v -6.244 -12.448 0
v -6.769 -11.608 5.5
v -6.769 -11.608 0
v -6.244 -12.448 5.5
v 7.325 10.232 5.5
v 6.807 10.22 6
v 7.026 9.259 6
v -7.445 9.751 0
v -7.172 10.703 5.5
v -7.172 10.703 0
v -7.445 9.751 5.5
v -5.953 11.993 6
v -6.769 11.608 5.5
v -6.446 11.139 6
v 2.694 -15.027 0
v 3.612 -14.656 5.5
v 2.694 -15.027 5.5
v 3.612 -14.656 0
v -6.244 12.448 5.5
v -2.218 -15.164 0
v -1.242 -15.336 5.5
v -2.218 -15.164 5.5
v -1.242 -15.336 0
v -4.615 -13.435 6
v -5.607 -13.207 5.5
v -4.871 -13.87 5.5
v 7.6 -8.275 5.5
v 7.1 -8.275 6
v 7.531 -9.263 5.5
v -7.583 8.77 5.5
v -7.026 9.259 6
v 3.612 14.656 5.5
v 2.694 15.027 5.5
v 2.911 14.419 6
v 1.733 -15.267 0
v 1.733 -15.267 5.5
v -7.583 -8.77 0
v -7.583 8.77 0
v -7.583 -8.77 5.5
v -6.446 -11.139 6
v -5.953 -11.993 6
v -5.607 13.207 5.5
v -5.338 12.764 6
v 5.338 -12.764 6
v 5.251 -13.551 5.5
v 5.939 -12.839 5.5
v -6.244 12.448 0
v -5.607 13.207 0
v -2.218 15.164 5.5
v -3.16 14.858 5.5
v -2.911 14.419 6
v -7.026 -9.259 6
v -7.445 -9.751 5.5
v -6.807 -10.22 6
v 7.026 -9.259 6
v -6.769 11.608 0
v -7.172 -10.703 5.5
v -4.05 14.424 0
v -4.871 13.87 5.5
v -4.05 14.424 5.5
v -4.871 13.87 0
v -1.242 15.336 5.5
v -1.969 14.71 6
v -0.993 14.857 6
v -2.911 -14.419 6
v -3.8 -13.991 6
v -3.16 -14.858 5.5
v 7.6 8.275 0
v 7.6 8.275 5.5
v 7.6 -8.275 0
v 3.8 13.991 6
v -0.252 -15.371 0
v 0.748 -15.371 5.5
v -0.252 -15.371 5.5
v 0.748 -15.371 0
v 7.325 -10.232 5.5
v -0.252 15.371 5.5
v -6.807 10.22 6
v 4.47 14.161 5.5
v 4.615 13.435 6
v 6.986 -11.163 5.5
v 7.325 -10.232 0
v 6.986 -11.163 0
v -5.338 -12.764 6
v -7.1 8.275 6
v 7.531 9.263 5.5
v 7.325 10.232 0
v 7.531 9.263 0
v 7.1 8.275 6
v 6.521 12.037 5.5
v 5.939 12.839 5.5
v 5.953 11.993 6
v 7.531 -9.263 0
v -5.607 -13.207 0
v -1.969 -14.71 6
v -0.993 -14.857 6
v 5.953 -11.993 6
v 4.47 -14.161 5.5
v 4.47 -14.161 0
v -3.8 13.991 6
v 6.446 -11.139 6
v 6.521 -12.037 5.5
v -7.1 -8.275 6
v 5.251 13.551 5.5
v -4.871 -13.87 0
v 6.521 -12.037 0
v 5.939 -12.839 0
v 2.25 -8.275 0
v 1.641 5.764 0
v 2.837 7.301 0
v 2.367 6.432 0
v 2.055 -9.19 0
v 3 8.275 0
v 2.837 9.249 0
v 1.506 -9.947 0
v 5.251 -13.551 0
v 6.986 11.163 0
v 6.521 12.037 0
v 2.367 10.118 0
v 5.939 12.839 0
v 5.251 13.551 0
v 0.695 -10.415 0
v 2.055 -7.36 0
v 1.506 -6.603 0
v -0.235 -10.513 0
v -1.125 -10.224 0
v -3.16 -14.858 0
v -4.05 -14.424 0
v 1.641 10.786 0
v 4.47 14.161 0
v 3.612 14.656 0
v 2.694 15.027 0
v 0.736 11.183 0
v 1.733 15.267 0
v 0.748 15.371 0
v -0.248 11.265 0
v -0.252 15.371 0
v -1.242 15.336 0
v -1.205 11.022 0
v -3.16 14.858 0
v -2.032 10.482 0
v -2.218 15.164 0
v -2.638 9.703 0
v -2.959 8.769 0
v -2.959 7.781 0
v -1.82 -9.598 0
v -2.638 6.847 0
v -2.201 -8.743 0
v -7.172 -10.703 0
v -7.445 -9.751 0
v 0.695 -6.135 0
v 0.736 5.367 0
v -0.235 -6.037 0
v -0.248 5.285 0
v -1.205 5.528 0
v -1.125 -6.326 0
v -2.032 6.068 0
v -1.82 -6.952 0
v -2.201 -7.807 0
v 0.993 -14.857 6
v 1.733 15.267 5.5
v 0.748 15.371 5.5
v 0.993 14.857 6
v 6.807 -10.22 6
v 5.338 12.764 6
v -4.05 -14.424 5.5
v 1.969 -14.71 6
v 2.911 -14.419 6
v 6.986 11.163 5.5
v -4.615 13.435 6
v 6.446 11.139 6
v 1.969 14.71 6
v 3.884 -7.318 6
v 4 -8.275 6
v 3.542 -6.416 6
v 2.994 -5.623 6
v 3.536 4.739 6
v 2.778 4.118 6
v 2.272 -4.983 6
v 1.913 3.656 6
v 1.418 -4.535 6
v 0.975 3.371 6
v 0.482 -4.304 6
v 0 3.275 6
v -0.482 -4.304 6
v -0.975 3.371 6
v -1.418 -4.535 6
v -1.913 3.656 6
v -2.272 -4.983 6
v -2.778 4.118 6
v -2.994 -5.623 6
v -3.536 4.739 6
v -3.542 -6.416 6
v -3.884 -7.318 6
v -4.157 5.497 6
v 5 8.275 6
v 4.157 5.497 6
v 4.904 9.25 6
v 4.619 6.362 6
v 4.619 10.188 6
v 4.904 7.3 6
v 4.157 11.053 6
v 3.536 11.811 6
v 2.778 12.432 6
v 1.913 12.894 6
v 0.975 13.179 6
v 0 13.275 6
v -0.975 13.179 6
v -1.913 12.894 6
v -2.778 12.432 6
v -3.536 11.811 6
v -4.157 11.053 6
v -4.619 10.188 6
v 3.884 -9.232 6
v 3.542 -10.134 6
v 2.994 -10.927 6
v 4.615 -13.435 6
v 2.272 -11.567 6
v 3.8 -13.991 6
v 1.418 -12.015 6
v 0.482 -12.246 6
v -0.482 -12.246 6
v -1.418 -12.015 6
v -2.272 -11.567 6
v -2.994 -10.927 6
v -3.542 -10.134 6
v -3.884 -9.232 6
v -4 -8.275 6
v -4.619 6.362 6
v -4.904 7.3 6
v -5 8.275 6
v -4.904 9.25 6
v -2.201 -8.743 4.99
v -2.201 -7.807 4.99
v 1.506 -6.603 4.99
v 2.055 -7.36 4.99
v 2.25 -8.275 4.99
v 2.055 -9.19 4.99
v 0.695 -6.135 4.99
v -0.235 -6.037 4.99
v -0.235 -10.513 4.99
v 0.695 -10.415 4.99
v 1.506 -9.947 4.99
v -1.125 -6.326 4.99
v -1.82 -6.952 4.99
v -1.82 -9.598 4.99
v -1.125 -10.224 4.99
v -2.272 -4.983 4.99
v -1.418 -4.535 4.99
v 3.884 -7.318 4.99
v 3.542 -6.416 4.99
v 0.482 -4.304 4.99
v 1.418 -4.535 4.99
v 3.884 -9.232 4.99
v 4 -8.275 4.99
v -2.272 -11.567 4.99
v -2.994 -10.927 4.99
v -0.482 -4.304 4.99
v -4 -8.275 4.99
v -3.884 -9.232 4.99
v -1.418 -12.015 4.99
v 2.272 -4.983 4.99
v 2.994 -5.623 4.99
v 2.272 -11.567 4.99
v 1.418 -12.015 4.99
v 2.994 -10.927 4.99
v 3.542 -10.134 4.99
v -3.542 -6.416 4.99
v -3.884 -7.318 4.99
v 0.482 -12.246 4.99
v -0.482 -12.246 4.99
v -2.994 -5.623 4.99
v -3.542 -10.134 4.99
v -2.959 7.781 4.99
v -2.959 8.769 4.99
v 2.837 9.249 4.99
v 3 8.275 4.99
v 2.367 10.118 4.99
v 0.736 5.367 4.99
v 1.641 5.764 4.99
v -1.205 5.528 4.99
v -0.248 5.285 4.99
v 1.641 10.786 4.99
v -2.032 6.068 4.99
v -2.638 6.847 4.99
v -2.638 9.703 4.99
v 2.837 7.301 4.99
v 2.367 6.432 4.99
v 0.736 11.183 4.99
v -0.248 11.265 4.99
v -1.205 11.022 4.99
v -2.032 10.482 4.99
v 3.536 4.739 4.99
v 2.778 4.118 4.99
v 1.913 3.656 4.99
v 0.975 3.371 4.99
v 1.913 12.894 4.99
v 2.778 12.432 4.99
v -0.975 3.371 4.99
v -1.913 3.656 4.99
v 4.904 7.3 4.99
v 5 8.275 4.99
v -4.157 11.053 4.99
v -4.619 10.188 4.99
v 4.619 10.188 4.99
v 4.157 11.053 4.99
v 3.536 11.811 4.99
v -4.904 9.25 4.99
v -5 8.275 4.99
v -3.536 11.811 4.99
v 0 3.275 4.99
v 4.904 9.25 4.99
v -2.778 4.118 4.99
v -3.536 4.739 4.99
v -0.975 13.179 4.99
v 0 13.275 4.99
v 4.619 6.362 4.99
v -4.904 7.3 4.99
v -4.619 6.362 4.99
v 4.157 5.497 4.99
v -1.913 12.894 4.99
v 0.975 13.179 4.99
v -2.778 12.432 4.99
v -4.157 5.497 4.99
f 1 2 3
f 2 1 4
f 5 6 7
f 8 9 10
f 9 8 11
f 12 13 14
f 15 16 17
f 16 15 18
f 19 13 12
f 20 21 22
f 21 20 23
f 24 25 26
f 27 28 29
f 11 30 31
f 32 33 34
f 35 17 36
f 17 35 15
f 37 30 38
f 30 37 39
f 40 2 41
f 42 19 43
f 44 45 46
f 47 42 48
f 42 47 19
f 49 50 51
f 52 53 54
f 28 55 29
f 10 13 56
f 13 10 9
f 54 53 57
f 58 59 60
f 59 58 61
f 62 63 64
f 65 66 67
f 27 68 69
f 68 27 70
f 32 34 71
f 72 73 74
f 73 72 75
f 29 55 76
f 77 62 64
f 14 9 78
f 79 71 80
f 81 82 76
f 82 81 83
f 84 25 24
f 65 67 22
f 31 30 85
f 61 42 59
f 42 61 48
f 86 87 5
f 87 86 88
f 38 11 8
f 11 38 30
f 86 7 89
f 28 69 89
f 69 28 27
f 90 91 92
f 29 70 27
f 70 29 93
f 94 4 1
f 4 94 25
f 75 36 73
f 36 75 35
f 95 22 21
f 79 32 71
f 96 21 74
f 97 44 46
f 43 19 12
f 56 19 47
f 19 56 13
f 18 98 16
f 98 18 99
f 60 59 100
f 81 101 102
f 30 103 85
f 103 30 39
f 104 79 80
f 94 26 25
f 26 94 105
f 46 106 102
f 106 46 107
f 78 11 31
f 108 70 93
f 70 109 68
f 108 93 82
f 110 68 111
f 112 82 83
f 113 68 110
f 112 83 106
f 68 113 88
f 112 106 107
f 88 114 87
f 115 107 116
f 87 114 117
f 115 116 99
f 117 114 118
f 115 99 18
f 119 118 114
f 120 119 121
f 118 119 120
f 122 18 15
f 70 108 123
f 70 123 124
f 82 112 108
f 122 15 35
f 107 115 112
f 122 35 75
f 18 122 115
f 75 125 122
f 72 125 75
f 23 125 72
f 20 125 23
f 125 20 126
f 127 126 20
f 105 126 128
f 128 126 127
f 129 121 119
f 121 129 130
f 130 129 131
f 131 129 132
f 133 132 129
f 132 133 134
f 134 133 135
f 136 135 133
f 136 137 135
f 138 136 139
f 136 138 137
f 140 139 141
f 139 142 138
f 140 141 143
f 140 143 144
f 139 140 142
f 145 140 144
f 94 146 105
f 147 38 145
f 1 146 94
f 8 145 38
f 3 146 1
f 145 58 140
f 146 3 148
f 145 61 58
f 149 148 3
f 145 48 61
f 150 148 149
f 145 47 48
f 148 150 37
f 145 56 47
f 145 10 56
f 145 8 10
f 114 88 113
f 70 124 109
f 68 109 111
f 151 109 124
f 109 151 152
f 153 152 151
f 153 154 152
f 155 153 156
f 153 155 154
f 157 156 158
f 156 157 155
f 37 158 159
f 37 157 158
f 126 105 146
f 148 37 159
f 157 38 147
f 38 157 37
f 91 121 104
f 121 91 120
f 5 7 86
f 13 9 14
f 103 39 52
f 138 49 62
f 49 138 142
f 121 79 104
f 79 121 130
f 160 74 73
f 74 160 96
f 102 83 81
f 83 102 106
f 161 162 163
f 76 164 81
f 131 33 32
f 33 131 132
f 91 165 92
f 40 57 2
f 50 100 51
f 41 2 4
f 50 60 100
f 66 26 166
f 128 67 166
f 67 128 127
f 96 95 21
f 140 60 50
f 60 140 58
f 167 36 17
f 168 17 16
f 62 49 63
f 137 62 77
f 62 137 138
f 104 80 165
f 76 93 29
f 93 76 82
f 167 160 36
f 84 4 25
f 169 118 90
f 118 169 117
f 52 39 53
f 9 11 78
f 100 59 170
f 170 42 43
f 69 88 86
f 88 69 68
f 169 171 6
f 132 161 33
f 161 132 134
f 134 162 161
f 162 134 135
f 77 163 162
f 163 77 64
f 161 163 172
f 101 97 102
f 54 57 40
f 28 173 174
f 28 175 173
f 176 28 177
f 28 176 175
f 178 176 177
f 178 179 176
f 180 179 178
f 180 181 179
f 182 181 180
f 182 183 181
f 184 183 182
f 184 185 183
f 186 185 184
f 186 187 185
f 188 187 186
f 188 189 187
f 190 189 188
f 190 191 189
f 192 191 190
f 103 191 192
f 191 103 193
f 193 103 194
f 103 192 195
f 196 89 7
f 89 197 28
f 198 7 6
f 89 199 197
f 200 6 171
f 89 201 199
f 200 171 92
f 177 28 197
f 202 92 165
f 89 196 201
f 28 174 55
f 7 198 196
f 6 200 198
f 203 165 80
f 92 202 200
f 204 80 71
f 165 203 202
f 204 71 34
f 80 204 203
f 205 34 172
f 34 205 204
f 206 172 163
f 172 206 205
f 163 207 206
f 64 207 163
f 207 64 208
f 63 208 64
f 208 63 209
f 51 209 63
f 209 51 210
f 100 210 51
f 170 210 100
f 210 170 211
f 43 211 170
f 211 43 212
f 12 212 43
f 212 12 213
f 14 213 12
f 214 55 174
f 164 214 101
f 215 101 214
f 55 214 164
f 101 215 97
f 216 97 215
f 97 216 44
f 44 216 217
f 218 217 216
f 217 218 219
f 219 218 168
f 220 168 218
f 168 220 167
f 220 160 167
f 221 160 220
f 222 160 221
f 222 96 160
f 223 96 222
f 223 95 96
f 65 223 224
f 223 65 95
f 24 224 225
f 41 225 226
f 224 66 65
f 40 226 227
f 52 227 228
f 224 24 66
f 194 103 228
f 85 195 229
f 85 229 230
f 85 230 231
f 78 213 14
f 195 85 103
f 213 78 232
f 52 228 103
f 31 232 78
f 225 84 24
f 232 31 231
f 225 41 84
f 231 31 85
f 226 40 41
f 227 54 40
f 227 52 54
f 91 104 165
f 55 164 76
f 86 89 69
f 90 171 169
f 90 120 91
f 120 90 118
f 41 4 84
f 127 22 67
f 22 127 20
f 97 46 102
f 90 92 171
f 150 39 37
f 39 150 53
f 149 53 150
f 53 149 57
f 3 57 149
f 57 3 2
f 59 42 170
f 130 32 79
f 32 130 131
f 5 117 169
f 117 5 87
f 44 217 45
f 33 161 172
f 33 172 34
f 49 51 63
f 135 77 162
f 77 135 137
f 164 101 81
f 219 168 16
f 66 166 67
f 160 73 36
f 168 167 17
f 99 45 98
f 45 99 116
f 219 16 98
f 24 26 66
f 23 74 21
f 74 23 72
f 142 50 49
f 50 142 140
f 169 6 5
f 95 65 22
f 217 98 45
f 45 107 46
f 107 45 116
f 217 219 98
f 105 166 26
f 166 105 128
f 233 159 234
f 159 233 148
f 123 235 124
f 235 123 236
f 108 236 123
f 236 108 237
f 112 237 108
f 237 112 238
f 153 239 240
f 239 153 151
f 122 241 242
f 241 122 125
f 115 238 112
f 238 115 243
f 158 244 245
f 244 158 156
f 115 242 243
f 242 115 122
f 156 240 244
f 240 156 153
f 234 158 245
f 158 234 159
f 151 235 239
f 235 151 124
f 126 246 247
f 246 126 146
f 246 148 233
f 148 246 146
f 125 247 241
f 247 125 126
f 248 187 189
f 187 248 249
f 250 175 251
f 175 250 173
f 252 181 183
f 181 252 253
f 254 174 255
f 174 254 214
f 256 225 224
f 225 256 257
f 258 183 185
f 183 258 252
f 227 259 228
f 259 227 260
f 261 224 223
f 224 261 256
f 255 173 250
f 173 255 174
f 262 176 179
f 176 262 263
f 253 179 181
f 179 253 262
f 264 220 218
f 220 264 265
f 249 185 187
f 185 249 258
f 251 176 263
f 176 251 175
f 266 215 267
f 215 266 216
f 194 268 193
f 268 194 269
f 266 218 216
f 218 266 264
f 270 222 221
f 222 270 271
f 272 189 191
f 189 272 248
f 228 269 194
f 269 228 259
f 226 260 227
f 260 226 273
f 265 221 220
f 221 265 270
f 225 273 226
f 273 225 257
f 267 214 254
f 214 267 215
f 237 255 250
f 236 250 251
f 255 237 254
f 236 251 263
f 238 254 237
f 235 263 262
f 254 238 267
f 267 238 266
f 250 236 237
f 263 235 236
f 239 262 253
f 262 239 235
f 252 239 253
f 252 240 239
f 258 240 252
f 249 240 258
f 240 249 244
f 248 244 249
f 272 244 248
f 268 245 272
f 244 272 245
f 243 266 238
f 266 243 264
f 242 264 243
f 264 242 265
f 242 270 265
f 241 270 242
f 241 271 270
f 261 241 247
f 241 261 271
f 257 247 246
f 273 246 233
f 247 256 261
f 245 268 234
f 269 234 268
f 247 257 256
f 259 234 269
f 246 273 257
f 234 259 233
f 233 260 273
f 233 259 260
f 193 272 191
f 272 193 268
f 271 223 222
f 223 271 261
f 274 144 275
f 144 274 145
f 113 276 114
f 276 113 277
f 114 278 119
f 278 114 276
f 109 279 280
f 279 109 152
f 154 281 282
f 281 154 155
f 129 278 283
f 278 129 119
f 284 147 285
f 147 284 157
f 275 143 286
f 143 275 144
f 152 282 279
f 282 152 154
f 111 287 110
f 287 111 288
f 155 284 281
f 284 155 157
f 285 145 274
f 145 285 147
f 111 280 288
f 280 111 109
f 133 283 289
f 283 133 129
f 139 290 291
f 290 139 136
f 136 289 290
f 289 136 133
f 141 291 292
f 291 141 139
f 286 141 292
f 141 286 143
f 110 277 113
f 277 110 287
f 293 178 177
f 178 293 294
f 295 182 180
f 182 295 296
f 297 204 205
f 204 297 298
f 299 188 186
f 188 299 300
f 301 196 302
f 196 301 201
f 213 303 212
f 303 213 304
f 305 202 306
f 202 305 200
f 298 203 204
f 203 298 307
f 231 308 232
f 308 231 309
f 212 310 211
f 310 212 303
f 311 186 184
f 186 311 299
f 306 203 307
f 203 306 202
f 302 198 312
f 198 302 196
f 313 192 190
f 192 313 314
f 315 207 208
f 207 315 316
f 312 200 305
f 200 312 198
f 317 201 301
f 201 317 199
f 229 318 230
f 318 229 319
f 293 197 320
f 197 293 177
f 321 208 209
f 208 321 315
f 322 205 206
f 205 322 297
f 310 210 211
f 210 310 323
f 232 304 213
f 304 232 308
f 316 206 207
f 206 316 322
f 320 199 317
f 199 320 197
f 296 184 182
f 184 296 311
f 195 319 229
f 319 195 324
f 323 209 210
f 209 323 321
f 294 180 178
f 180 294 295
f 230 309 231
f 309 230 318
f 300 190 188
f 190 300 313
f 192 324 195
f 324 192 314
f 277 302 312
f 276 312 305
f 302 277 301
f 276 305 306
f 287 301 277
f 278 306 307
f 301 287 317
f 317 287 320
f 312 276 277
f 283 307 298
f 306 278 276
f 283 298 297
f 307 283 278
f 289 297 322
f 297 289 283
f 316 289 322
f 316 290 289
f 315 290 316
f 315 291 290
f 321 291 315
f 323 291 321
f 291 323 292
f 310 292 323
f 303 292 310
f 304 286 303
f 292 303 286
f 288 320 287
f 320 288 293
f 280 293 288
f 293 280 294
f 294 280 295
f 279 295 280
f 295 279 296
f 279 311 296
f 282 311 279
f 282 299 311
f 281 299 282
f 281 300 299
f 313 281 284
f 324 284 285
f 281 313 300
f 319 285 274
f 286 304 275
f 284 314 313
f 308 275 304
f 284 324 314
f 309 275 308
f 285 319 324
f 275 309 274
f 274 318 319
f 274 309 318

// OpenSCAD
// file: base_config.scad
atx_height=86.6;
atx_width=150;
atx_depth=140;
vertical_buffer=5.2; //2.6 above and below atx box

atx_upper_screw_spacing=138;

atx_upper_screw_height=80;

grid_wall_thick=10;

wall_screw_vert=10;
wall_screw_horz=12;

atx_screw_depth=12.7-5.8;

atx_screw_slot=3.9;
atx_screw_head=7.5;

atx_screw_head_t=2.4;

m4_head = 8;
m4_nut_r=8.1/2;
m3_head_r=6.1/2;
m3_head_t=2.5;
m4_slot=4.5;

dual_overlap=(6.6/2+3.2);
// file: config.scad
//triangular vertex peices
$fa=1;
$fs=1;
ep=0.01;
//parametrics
//cutout for the AL extrusions, with 2 opposite tracks having an inset
//tweaked from ideal to satisfy printing limits
side=20;    //size of a side of the extrusion
slot=6-.4;     //width of the slots, on the face
central=8+1;  //how wide the central pillar is; the slot depth is then (side-central)/2
//corner radius
vertex_rad=40;
//distance from edge to vertical 2020 shaft
vert_inset=6;
//thickness of the wall on the inside of the triangle
inside_wall_thick=6;
//belt channel width
channel_width=26;
//lenght of plastic alongside in-plane extrusion
wing_length=70;
//height of the frame piece
piece_h=50;
//mounting hardware
m5_slot=6;
m5_head=10; //diameter of M5 head
m5_wall=5; //thickness of plastic between M5 and extrusion
//m3 sizing
m3_slot=3.5;
m3nut_r=6.6/2;
m3nut_t=3;
module 2020_cutout_two()
{
    ss=side+.8; //printer tolerance
    difference()
    {
        //main body
        square([ss,ss],center=true);
        //track slots
        translate([ss/2+central/2,0])square([ss,slot],center=true);
        translate([-(ss/2+central/2),0])square([ss,slot],center=true);
        translate([0,(ss/2+central/2)])square([slot,ss],center=true);
    }
}
module nut_fill()
{
    nut_w=10.5+1;
    nut_w_b=6.5+1.5;
    nut_depth=(side-central)/2;
    //spaces for inserting the t slot nuts
    //translate([0,0,-nut_depth/2])
    hull()
    {
        cube([nut_w+3,nut_w*2,ep],center=true);
        translate([0,0,-nut_depth])cube([nut_w_b,nut_w*2,ep],center=true);
    }
    //cube([nut_w,nut_w*2,nut_depth],center=true);
}
module base_shape()
{
    difference()
    {
        union()
        {
            //rounded vertex
            circle(r=vertex_rad,center=true);
            //'wings' along in plane extrusion lengths
            rotate([0,0,60])translate([-side+vertex_rad-inside_wall_thick*2,wing_length/2])square([inside_wall_thick*4,wing_length],center=true); 
            rotate([0,0,-60])translate([-side+vertex_rad-inside_wall_thick*2,-wing_length/2])square([inside_wall_thick*4,wing_length],center=true); 
        }
        //in plane extrusions
        rotate([0,0,60])translate([-side/2+vertex_rad,vertex_rad/2])square([side,vertex_rad],center=true);
        rotate([0,0,-60])translate([-side/2+vertex_rad,-vertex_rad/2])square([side,vertex_rad],center=true);
        //vertical extrusion
        translate([(-side/2)+vertex_rad-vert_inset,0,0])rotate([0,0,90])2020_cutout_two();
        //opening for belts or motor
        motor_gap();
        //any remaining portion of hte circle we want removed
        open_inside();
    }
}
module motor_gap()
{
    //create rough triangle of unneeded area
    round=2;
    xx=-side-inside_wall_thick-round;
    qq=-(channel_width)/2+vertex_rad-vert_inset-side-inside_wall_thick;
    //make round
    minkowski()
    {
        intersection()
        {
            rotate([0,0,60])translate([xx,0])square([vertex_rad*2,vertex_rad*4],center=true);
            rotate([0,0,-60])translate([xx,0])square([vertex_rad*2,vertex_rad*4],center=true);
            translate([qq,0])square([channel_width-round*2,vertex_rad*2],center=true);
        }
        circle(r=round+0.01,$fn=40);
    }
}
module open_inside()
{
    //rest of interior
    //create rough triangle of unneeded area
    round=2;
    xx=-side-inside_wall_thick-round;
    qq=-side-inside_wall_thick-vert_inset-channel_width-inside_wall_thick;
    //make round
    minkowski()
    {
        intersection()
        {
            rotate([0,0,60])translate([xx,wing_length])square([vertex_rad*2,vertex_rad*4+wing_length],center=true);
            rotate([0,0,-60])translate([xx,-wing_length])square([vertex_rad*2,vertex_rad*4+wing_length],center=true);
            translate([qq,0])square([vertex_rad*2-round*2,vertex_rad*2+wing_length],center=true);
        }
        circle(r=round+0.01,$fn=40);
    }
}
// main file
include <config.scad>;
include <base_config.scad>;

base_ext_l=331;

fit_tolerance=.5; //added gap between elements

bracket_wall=3.2;

truss_wall=2.39;

bevel=.5;

//edge to (upper) hole
euh=(base_ext_l-atx_upper_screw_spacing)/2;
//additional added to left side edge, to cover area around mount
mount_overlap=5;
//center of hole to edge of screw recess, and edge total overlap
eto=atx_screw_head/2+mount_overlap;
plate_round=2;
//plate height
ph=vertical_buffer+atx_height-fit_tolerance*2; //tolerance gap top and bottom

//ATX box needs a little bit of recess
atx_recess=grid_wall_thick-(atx_screw_depth+atx_screw_head_t);

//right();
//left();
base_tie();

module left()
{
    translate([.5*(eto+euh-fit_tolerance)+fit_tolerance-base_ext_l/2,0,0])
    {
        difference()
        {
            union()
            {
                rough_shape();
                slope();
            }
            atx_cutout();
            truss_grid(truss_wall);
            mirror([0,1,0])truss_grid(truss_wall);
            m3_holes();
            atx_holes_left();
            m4_hole();
        }
        
        difference()
        {
            m4_mount();
            m4_hole();
        }
    }
}

module right()
{
    mirror([1,0,0])translate([.5*(eto+euh-fit_tolerance)+fit_tolerance-base_ext_l/2,0,0])
    {
        difference()
        {
            union()
            {
                rough_shape();
                rough_shape_right();
                slope();
            }
            atx_cutout_right();
            truss_grid(truss_wall);
            mirror([0,1,0])truss_grid(truss_wall);
            m3_holes();
            atx_holes_right();
            m4_hole();
        }
        
        difference()
        {
            m4_mount();
            m4_hole();
        }
    }
}

//connector from m4 to M5 on extrusion
module base_tie()
{
    spacing=(m4_nut_r+2.0)+side/2+fit_tolerance;
    difference()
    {
        hull()
        {
            linear_extrude(height=inside_wall_thick-bevel)minkowski()
            {
                square([1,spacing],center=true);
                circle(r=m5_head/2+2.1);
            }
            linear_extrude(height=inside_wall_thick)minkowski()
            {
                square([1,spacing],center=true);
                circle(r=m5_head/2+2.1-bevel);
            }
        }
        //m4
        translate([0,-.5*spacing,-ep])cylinder(r=m4_slot/2,h=inside_wall_thick+2*ep);
        translate([0,-.5*spacing,m5_wall-ep])cylinder(r=m4_head/2,h=1+2*ep);
        //m5
        translate([0,.5*spacing,-ep])cylinder(r=m5_slot/2,h=inside_wall_thick+2*ep);
        translate([0,.5*spacing,m5_wall-ep])cylinder(r=m5_head/2,h=1+2*ep);
    }
    
}

//slope
module slope()
{
    intersection()
    {
        hull()
        {
            translate([20/2-(eto+euh-fit_tolerance)/2+euh-(atx_width-atx_upper_screw_spacing)/2-fit_tolerance*1.5-bracket_wall,0,.5])cube([20,ph+5,1],center=true);
            translate([20/2-(eto+euh-fit_tolerance)/2+euh-(atx_width-atx_upper_screw_spacing)/2-fit_tolerance*1.5-bracket_wall,-ph/2,-atx_depth/3])cube([20,1,1],center=true);
        }
        translate([0,0,-atx_depth/2])linear_extrude(height=atx_depth)rough_outline(plate_round);
    }
}

//m3 holes
module m3_holes()
{
    for(aa=[-.5:1:.5])
    {
    translate([-(eto+euh-fit_tolerance)/2-fit_tolerance+wall_screw_horz,aa*(vertical_buffer+atx_height-wall_screw_vert*2),-ep])cylinder(r=m3_slot/2,h=grid_wall_thick+ep*2);
        translate([-(eto+euh-fit_tolerance)/2-fit_tolerance+wall_screw_horz,aa*(vertical_buffer+atx_height-wall_screw_vert*2),-ep+grid_wall_thick-m3nut_t])cylinder(r=m3_head_r,h=m3nut_t*2);
        translate([-(eto+euh-fit_tolerance)/2-fit_tolerance+wall_screw_horz,aa*(vertical_buffer+atx_height-wall_screw_vert*2),-ep+grid_wall_thick-m3nut_t-1])cylinder(r2=m3_head_r,r1=m3_slot/2,h=1+ep);
    }
}
//atx holes
module atx_holes_left()
{
    //atx screws y centering
    yy=-(ph/2)+(atx_height+fit_tolerance)/2+3;
    lower_left_y=yy-atx_height/2+16;
    upper_left_y=yy-atx_height/2+16+64; //per technical drawings
    translate([0,lower_left_y,0])
    {
    translate([-(eto+euh-fit_tolerance)/2-fit_tolerance+euh,0,-ep])cylinder(r=atx_screw_slot/2,h=grid_wall_thick+ep*2);
        translate([-(eto+euh-fit_tolerance)/2-fit_tolerance+euh,0,-ep+grid_wall_thick-m3nut_t])cylinder(r=atx_screw_head/2,h=m3nut_t*2);
        translate([-(eto+euh-fit_tolerance)/2-fit_tolerance+euh,0,-ep+grid_wall_thick-m3nut_t-1])cylinder(r2=atx_screw_head/2,r1=atx_screw_slot/2,h=1+ep);
    }
    translate([0,upper_left_y,0])
    {
    translate([-(eto+euh-fit_tolerance)/2-fit_tolerance+euh,0,-ep])cylinder(r=atx_screw_slot/2,h=grid_wall_thick+ep*2);
        translate([-(eto+euh-fit_tolerance)/2-fit_tolerance+euh,0,-ep+grid_wall_thick-m3nut_t])cylinder(r=atx_screw_head/2,h=m3nut_t*2);
        translate([-(eto+euh-fit_tolerance)/2-fit_tolerance+euh,0,-ep+grid_wall_thick-m3nut_t-1])cylinder(r2=atx_screw_head/2,r1=atx_screw_slot/2,h=1+ep);
    }
    
}
module atx_holes_right()
{
    //atx screws y centering
    yy=-(ph/2)+(atx_height+fit_tolerance)/2+3;
    lower_y=yy-atx_height/2+6;
    upper_y=yy-atx_height/2+16+64; //per technical drawings
    lower_x=24;
    translate([lower_x,lower_y,0])
    {
    translate([-(eto+euh-fit_tolerance)/2-fit_tolerance+euh,0,-ep])cylinder(r=atx_screw_slot/2,h=grid_wall_thick+ep*2);
        translate([-(eto+euh-fit_tolerance)/2-fit_tolerance+euh,0,-ep+grid_wall_thick-m3nut_t])cylinder(r=atx_screw_head/2,h=m3nut_t*2);
        translate([-(eto+euh-fit_tolerance)/2-fit_tolerance+euh,0,-ep+grid_wall_thick-m3nut_t-1])cylinder(r2=atx_screw_head/2,r1=atx_screw_slot/2,h=1+ep);
    }
    translate([0,upper_y,0])
    {
    translate([-(eto+euh-fit_tolerance)/2-fit_tolerance+euh,0,-ep])cylinder(r=atx_screw_slot/2,h=grid_wall_thick+ep*2);
        translate([-(eto+euh-fit_tolerance)/2-fit_tolerance+euh,0,-ep+grid_wall_thick-m3nut_t])cylinder(r=atx_screw_head/2,h=m3nut_t*2);
        translate([-(eto+euh-fit_tolerance)/2-fit_tolerance+euh,0,-ep+grid_wall_thick-m3nut_t-1])cylinder(r2=atx_screw_head/2,r1=atx_screw_slot/2,h=1+ep);
    }
    
}

//m4 mount hole, for connection to frame
module m4_mount()
{
    translate([-(eto+euh-fit_tolerance)/2-fit_tolerance+wall_screw_horz+1.5*m3_slot+linear_x/2,ph/2-(m4_nut_r+2.0),0])
    {
        cylinder(r1=m4_nut_r+2-bevel,r2=m4_nut_r+2,h=bevel);
        translate([0,0,bevel])cylinder(r=m4_nut_r+2,h=grid_wall_thick-bevel*2);
        translate([0,0,grid_wall_thick-bevel])cylinder(r2=m4_nut_r+2-bevel,r1=m4_nut_r+2,h=bevel);
    }
}
module m4_hole()
{
    translate([-(eto+euh-fit_tolerance)/2-fit_tolerance+wall_screw_horz+1.5*m3_slot+linear_x/2,ph/2-(m4_nut_r+2.0),-ep])
    {
        cylinder(r=m4_slot/2,h=grid_wall_thick+ep*2);
        cylinder(r=m4_nut_r,h=m3nut_t,$fn=6);
    }
}


module rough_outline(pr)
{
    //rough rectangle, one tolerance at edge by post
    minkowski()
    {
        square([eto+euh-fit_tolerance-plate_round*2,ph-plate_round*2],center=true);
        circle(r=pr,$fn=40);
    }
}
module rough_outline_right(pr)
{
    //rough rectangle, one tolerance at edge by post
    tongue=18;
    minkowski()
    {
        translate([tongue,-ph/2+7.75,0])square([tongue+eto+euh-fit_tolerance-plate_round*2,15.5-plate_round*2],center=true);
        
        circle(r=pr,$fn=40);
    }
}
module rough_shape()
{
    //bevel
    hull()
    {
        translate([0,0,grid_wall_thick-ep])linear_extrude(height=ep)rough_outline(plate_round-bevel);
        translate([0,0,grid_wall_thick-bevel-ep])linear_extrude(height=ep)rough_outline(plate_round);
    }
    translate([0,0,bevel])linear_extrude(height=grid_wall_thick-bevel*2)rough_outline(plate_round);
    hull()
    {
        translate([0,0,0])linear_extrude(height=ep)rough_outline(plate_round-bevel);
        translate([0,0,bevel])linear_extrude(height=ep)rough_outline(plate_round);
    }
        
}
module rough_shape_right()
{
    //bevel
    hull()
    {
        translate([0,0,grid_wall_thick-ep])linear_extrude(height=ep)rough_outline_right(plate_round-bevel);
        translate([0,0,grid_wall_thick-bevel-ep])linear_extrude(height=ep)rough_outline_right(plate_round);
    }
    translate([0,0,bevel])linear_extrude(height=grid_wall_thick-bevel*2)rough_outline_right(plate_round);
    hull()
    {
        translate([0,0,0])linear_extrude(height=ep)rough_outline_right(plate_round-bevel);
        translate([0,0,bevel])linear_extrude(height=ep)rough_outline_right(plate_round);
    }
        
}
module atx_cutout()
{
    //align such that 3mm 'shelf' at the bottom
    yy=-(ph/2)+(atx_height+fit_tolerance)/2+3;
    //alight so that atx ends up in middle
    xx=-(eto+euh-fit_tolerance)/2+-fit_tolerance+base_ext_l/2;
    //align for screw depth
    zz=-(atx_depth/2)+atx_recess;
    translate([xx,yy,zz])cube([atx_width+fit_tolerance,atx_height+fit_tolerance,atx_depth],center=true);
}
module atx_cutout_right()
{
    //align such that 3mm 'shelf' at the bottom
    yy=-(ph/2)+(atx_height+fit_tolerance)/2+3;
    //alight so that atx ends up in middle
    xx=-(eto+euh-fit_tolerance)/2+-fit_tolerance+base_ext_l/2;
    //align for screw depth
    zz=-(atx_depth/2)+atx_recess;
    translate([xx,yy,zz])cube([atx_width+fit_tolerance,atx_height+fit_tolerance,atx_depth],center=true);
    //plug
    translate([xx-atx_width/2+31.5,yy-atx_height/2+25,zz+atx_depth/2+6.8/2-ep])cube([50,25,16.8],center=true);
}

    //space occupied
    //distance between screw hole on post, and wall on atx bracket
    linear_x=(base_ext_l-atx_width)/2-wall_screw_horz-bracket_wall-1.5*m3_slot;
    //we will arrange two rows of triangles
    triangle_height_0=ph/2-truss_wall/2;
    //assuming equilateral triangles,
    ideal_width=2*triangle_height_0/sqrt(3);
    //how many triangles?
    triangle_num=1;//round(linear_x/ideal_width);
    //width of triangles
    triangle_width_0=linear_x/triangle_num;
    th0=triangle_height_0;
    tw0=triangle_width_0;
    te0=sqrt(th0*th0+(tw0/2*tw0/2));
    base_angle=acos((tw0/2)/te0);
    tip_angle=180-(base_angle*2);

module truss_grid(wall)
{
    translate([-(eto+euh-fit_tolerance)/2-fit_tolerance+wall_screw_horz+1.5*m3_slot+linear_x/2,0,0])
    {
        //center triangle
        hull()
        {
            //top
            translate([0,0,grid_wall_thick])linear_extrude(height=ep)minkowski()
            {
                center_tri(wall);
                circle(r=bevel,$fn=40);
            }
            //mid 2
            translate([0,0,grid_wall_thick-ep-bevel])linear_extrude(height=ep)center_tri(wall);
        }
        linear_extrude(height=grid_wall_thick)center_tri(wall);
        hull()
        {
            //mid 1
            translate([0,0,bevel])linear_extrude(height=ep)center_tri(wall);
            //bottom
            translate([0,0,-ep])linear_extrude(height=ep)minkowski()
            {
                center_tri(wall);
                circle(r=bevel,$fn=40);
            }
        }
        //left triangle
        hull()
        {
            translate([0,0,grid_wall_thick])linear_extrude(height=ep)minkowski()
            {
                left_tri(wall);
                circle(r=bevel,$fn=40);
            }
            translate([0,0,grid_wall_thick-ep-bevel])linear_extrude(height=ep)left_tri(wall);
        }
        linear_extrude(height=grid_wall_thick)left_tri(wall);
        hull()
        {
            translate([0,0,bevel])linear_extrude(height=ep)left_tri(wall);
            
            translate([0,0,-ep])linear_extrude(height=ep)minkowski()
            {
                left_tri(wall);
                circle(r=bevel,$fn=40);
            }
        }

        //left triangle
        hull()
        {
            translate([0,0,grid_wall_thick])linear_extrude(height=ep)minkowski()
            {
                right_tri(wall);
                circle(r=bevel,$fn=40);
            }
            translate([0,0,grid_wall_thick-ep-bevel])linear_extrude(height=ep)right_tri(wall);
        }
        linear_extrude(height=grid_wall_thick)right_tri(wall);
        hull()
        {
            translate([0,0,bevel])linear_extrude(height=ep)right_tri(wall);
            
            translate([0,0,-ep])linear_extrude(height=ep)minkowski()
            {
                right_tri(wall);
                circle(r=bevel,$fn=40);
            }
        }
    }
}
module center_tri(wall)
{
    polygon(points=
    [[0,th0-(wall/2/sin(tip_angle/2))],
    [-((tw0/2)-wall/2/tan(base_angle/2)),wall/2],
    [((tw0/2)-wall/2/tan(base_angle/2)),wall/2]]);
}
module left_tri(wall)
{
    polygon(points=[[-(tw0/2-wall/2),th0-wall/2],
    [-(wall/2/tan(base_angle/2)),th0-wall/2],
    [-(tw0/2-wall/2),(wall/2/tan(tip_angle/4))]]);
}
module right_tri(wall)
{
    polygon(points=[[(tw0/2-wall/2),th0-wall/2],
    [(wall/2/tan(base_angle/2)),th0-wall/2],
    [(tw0/2-wall/2),(wall/2/tan(tip_angle/4))]]);
}
